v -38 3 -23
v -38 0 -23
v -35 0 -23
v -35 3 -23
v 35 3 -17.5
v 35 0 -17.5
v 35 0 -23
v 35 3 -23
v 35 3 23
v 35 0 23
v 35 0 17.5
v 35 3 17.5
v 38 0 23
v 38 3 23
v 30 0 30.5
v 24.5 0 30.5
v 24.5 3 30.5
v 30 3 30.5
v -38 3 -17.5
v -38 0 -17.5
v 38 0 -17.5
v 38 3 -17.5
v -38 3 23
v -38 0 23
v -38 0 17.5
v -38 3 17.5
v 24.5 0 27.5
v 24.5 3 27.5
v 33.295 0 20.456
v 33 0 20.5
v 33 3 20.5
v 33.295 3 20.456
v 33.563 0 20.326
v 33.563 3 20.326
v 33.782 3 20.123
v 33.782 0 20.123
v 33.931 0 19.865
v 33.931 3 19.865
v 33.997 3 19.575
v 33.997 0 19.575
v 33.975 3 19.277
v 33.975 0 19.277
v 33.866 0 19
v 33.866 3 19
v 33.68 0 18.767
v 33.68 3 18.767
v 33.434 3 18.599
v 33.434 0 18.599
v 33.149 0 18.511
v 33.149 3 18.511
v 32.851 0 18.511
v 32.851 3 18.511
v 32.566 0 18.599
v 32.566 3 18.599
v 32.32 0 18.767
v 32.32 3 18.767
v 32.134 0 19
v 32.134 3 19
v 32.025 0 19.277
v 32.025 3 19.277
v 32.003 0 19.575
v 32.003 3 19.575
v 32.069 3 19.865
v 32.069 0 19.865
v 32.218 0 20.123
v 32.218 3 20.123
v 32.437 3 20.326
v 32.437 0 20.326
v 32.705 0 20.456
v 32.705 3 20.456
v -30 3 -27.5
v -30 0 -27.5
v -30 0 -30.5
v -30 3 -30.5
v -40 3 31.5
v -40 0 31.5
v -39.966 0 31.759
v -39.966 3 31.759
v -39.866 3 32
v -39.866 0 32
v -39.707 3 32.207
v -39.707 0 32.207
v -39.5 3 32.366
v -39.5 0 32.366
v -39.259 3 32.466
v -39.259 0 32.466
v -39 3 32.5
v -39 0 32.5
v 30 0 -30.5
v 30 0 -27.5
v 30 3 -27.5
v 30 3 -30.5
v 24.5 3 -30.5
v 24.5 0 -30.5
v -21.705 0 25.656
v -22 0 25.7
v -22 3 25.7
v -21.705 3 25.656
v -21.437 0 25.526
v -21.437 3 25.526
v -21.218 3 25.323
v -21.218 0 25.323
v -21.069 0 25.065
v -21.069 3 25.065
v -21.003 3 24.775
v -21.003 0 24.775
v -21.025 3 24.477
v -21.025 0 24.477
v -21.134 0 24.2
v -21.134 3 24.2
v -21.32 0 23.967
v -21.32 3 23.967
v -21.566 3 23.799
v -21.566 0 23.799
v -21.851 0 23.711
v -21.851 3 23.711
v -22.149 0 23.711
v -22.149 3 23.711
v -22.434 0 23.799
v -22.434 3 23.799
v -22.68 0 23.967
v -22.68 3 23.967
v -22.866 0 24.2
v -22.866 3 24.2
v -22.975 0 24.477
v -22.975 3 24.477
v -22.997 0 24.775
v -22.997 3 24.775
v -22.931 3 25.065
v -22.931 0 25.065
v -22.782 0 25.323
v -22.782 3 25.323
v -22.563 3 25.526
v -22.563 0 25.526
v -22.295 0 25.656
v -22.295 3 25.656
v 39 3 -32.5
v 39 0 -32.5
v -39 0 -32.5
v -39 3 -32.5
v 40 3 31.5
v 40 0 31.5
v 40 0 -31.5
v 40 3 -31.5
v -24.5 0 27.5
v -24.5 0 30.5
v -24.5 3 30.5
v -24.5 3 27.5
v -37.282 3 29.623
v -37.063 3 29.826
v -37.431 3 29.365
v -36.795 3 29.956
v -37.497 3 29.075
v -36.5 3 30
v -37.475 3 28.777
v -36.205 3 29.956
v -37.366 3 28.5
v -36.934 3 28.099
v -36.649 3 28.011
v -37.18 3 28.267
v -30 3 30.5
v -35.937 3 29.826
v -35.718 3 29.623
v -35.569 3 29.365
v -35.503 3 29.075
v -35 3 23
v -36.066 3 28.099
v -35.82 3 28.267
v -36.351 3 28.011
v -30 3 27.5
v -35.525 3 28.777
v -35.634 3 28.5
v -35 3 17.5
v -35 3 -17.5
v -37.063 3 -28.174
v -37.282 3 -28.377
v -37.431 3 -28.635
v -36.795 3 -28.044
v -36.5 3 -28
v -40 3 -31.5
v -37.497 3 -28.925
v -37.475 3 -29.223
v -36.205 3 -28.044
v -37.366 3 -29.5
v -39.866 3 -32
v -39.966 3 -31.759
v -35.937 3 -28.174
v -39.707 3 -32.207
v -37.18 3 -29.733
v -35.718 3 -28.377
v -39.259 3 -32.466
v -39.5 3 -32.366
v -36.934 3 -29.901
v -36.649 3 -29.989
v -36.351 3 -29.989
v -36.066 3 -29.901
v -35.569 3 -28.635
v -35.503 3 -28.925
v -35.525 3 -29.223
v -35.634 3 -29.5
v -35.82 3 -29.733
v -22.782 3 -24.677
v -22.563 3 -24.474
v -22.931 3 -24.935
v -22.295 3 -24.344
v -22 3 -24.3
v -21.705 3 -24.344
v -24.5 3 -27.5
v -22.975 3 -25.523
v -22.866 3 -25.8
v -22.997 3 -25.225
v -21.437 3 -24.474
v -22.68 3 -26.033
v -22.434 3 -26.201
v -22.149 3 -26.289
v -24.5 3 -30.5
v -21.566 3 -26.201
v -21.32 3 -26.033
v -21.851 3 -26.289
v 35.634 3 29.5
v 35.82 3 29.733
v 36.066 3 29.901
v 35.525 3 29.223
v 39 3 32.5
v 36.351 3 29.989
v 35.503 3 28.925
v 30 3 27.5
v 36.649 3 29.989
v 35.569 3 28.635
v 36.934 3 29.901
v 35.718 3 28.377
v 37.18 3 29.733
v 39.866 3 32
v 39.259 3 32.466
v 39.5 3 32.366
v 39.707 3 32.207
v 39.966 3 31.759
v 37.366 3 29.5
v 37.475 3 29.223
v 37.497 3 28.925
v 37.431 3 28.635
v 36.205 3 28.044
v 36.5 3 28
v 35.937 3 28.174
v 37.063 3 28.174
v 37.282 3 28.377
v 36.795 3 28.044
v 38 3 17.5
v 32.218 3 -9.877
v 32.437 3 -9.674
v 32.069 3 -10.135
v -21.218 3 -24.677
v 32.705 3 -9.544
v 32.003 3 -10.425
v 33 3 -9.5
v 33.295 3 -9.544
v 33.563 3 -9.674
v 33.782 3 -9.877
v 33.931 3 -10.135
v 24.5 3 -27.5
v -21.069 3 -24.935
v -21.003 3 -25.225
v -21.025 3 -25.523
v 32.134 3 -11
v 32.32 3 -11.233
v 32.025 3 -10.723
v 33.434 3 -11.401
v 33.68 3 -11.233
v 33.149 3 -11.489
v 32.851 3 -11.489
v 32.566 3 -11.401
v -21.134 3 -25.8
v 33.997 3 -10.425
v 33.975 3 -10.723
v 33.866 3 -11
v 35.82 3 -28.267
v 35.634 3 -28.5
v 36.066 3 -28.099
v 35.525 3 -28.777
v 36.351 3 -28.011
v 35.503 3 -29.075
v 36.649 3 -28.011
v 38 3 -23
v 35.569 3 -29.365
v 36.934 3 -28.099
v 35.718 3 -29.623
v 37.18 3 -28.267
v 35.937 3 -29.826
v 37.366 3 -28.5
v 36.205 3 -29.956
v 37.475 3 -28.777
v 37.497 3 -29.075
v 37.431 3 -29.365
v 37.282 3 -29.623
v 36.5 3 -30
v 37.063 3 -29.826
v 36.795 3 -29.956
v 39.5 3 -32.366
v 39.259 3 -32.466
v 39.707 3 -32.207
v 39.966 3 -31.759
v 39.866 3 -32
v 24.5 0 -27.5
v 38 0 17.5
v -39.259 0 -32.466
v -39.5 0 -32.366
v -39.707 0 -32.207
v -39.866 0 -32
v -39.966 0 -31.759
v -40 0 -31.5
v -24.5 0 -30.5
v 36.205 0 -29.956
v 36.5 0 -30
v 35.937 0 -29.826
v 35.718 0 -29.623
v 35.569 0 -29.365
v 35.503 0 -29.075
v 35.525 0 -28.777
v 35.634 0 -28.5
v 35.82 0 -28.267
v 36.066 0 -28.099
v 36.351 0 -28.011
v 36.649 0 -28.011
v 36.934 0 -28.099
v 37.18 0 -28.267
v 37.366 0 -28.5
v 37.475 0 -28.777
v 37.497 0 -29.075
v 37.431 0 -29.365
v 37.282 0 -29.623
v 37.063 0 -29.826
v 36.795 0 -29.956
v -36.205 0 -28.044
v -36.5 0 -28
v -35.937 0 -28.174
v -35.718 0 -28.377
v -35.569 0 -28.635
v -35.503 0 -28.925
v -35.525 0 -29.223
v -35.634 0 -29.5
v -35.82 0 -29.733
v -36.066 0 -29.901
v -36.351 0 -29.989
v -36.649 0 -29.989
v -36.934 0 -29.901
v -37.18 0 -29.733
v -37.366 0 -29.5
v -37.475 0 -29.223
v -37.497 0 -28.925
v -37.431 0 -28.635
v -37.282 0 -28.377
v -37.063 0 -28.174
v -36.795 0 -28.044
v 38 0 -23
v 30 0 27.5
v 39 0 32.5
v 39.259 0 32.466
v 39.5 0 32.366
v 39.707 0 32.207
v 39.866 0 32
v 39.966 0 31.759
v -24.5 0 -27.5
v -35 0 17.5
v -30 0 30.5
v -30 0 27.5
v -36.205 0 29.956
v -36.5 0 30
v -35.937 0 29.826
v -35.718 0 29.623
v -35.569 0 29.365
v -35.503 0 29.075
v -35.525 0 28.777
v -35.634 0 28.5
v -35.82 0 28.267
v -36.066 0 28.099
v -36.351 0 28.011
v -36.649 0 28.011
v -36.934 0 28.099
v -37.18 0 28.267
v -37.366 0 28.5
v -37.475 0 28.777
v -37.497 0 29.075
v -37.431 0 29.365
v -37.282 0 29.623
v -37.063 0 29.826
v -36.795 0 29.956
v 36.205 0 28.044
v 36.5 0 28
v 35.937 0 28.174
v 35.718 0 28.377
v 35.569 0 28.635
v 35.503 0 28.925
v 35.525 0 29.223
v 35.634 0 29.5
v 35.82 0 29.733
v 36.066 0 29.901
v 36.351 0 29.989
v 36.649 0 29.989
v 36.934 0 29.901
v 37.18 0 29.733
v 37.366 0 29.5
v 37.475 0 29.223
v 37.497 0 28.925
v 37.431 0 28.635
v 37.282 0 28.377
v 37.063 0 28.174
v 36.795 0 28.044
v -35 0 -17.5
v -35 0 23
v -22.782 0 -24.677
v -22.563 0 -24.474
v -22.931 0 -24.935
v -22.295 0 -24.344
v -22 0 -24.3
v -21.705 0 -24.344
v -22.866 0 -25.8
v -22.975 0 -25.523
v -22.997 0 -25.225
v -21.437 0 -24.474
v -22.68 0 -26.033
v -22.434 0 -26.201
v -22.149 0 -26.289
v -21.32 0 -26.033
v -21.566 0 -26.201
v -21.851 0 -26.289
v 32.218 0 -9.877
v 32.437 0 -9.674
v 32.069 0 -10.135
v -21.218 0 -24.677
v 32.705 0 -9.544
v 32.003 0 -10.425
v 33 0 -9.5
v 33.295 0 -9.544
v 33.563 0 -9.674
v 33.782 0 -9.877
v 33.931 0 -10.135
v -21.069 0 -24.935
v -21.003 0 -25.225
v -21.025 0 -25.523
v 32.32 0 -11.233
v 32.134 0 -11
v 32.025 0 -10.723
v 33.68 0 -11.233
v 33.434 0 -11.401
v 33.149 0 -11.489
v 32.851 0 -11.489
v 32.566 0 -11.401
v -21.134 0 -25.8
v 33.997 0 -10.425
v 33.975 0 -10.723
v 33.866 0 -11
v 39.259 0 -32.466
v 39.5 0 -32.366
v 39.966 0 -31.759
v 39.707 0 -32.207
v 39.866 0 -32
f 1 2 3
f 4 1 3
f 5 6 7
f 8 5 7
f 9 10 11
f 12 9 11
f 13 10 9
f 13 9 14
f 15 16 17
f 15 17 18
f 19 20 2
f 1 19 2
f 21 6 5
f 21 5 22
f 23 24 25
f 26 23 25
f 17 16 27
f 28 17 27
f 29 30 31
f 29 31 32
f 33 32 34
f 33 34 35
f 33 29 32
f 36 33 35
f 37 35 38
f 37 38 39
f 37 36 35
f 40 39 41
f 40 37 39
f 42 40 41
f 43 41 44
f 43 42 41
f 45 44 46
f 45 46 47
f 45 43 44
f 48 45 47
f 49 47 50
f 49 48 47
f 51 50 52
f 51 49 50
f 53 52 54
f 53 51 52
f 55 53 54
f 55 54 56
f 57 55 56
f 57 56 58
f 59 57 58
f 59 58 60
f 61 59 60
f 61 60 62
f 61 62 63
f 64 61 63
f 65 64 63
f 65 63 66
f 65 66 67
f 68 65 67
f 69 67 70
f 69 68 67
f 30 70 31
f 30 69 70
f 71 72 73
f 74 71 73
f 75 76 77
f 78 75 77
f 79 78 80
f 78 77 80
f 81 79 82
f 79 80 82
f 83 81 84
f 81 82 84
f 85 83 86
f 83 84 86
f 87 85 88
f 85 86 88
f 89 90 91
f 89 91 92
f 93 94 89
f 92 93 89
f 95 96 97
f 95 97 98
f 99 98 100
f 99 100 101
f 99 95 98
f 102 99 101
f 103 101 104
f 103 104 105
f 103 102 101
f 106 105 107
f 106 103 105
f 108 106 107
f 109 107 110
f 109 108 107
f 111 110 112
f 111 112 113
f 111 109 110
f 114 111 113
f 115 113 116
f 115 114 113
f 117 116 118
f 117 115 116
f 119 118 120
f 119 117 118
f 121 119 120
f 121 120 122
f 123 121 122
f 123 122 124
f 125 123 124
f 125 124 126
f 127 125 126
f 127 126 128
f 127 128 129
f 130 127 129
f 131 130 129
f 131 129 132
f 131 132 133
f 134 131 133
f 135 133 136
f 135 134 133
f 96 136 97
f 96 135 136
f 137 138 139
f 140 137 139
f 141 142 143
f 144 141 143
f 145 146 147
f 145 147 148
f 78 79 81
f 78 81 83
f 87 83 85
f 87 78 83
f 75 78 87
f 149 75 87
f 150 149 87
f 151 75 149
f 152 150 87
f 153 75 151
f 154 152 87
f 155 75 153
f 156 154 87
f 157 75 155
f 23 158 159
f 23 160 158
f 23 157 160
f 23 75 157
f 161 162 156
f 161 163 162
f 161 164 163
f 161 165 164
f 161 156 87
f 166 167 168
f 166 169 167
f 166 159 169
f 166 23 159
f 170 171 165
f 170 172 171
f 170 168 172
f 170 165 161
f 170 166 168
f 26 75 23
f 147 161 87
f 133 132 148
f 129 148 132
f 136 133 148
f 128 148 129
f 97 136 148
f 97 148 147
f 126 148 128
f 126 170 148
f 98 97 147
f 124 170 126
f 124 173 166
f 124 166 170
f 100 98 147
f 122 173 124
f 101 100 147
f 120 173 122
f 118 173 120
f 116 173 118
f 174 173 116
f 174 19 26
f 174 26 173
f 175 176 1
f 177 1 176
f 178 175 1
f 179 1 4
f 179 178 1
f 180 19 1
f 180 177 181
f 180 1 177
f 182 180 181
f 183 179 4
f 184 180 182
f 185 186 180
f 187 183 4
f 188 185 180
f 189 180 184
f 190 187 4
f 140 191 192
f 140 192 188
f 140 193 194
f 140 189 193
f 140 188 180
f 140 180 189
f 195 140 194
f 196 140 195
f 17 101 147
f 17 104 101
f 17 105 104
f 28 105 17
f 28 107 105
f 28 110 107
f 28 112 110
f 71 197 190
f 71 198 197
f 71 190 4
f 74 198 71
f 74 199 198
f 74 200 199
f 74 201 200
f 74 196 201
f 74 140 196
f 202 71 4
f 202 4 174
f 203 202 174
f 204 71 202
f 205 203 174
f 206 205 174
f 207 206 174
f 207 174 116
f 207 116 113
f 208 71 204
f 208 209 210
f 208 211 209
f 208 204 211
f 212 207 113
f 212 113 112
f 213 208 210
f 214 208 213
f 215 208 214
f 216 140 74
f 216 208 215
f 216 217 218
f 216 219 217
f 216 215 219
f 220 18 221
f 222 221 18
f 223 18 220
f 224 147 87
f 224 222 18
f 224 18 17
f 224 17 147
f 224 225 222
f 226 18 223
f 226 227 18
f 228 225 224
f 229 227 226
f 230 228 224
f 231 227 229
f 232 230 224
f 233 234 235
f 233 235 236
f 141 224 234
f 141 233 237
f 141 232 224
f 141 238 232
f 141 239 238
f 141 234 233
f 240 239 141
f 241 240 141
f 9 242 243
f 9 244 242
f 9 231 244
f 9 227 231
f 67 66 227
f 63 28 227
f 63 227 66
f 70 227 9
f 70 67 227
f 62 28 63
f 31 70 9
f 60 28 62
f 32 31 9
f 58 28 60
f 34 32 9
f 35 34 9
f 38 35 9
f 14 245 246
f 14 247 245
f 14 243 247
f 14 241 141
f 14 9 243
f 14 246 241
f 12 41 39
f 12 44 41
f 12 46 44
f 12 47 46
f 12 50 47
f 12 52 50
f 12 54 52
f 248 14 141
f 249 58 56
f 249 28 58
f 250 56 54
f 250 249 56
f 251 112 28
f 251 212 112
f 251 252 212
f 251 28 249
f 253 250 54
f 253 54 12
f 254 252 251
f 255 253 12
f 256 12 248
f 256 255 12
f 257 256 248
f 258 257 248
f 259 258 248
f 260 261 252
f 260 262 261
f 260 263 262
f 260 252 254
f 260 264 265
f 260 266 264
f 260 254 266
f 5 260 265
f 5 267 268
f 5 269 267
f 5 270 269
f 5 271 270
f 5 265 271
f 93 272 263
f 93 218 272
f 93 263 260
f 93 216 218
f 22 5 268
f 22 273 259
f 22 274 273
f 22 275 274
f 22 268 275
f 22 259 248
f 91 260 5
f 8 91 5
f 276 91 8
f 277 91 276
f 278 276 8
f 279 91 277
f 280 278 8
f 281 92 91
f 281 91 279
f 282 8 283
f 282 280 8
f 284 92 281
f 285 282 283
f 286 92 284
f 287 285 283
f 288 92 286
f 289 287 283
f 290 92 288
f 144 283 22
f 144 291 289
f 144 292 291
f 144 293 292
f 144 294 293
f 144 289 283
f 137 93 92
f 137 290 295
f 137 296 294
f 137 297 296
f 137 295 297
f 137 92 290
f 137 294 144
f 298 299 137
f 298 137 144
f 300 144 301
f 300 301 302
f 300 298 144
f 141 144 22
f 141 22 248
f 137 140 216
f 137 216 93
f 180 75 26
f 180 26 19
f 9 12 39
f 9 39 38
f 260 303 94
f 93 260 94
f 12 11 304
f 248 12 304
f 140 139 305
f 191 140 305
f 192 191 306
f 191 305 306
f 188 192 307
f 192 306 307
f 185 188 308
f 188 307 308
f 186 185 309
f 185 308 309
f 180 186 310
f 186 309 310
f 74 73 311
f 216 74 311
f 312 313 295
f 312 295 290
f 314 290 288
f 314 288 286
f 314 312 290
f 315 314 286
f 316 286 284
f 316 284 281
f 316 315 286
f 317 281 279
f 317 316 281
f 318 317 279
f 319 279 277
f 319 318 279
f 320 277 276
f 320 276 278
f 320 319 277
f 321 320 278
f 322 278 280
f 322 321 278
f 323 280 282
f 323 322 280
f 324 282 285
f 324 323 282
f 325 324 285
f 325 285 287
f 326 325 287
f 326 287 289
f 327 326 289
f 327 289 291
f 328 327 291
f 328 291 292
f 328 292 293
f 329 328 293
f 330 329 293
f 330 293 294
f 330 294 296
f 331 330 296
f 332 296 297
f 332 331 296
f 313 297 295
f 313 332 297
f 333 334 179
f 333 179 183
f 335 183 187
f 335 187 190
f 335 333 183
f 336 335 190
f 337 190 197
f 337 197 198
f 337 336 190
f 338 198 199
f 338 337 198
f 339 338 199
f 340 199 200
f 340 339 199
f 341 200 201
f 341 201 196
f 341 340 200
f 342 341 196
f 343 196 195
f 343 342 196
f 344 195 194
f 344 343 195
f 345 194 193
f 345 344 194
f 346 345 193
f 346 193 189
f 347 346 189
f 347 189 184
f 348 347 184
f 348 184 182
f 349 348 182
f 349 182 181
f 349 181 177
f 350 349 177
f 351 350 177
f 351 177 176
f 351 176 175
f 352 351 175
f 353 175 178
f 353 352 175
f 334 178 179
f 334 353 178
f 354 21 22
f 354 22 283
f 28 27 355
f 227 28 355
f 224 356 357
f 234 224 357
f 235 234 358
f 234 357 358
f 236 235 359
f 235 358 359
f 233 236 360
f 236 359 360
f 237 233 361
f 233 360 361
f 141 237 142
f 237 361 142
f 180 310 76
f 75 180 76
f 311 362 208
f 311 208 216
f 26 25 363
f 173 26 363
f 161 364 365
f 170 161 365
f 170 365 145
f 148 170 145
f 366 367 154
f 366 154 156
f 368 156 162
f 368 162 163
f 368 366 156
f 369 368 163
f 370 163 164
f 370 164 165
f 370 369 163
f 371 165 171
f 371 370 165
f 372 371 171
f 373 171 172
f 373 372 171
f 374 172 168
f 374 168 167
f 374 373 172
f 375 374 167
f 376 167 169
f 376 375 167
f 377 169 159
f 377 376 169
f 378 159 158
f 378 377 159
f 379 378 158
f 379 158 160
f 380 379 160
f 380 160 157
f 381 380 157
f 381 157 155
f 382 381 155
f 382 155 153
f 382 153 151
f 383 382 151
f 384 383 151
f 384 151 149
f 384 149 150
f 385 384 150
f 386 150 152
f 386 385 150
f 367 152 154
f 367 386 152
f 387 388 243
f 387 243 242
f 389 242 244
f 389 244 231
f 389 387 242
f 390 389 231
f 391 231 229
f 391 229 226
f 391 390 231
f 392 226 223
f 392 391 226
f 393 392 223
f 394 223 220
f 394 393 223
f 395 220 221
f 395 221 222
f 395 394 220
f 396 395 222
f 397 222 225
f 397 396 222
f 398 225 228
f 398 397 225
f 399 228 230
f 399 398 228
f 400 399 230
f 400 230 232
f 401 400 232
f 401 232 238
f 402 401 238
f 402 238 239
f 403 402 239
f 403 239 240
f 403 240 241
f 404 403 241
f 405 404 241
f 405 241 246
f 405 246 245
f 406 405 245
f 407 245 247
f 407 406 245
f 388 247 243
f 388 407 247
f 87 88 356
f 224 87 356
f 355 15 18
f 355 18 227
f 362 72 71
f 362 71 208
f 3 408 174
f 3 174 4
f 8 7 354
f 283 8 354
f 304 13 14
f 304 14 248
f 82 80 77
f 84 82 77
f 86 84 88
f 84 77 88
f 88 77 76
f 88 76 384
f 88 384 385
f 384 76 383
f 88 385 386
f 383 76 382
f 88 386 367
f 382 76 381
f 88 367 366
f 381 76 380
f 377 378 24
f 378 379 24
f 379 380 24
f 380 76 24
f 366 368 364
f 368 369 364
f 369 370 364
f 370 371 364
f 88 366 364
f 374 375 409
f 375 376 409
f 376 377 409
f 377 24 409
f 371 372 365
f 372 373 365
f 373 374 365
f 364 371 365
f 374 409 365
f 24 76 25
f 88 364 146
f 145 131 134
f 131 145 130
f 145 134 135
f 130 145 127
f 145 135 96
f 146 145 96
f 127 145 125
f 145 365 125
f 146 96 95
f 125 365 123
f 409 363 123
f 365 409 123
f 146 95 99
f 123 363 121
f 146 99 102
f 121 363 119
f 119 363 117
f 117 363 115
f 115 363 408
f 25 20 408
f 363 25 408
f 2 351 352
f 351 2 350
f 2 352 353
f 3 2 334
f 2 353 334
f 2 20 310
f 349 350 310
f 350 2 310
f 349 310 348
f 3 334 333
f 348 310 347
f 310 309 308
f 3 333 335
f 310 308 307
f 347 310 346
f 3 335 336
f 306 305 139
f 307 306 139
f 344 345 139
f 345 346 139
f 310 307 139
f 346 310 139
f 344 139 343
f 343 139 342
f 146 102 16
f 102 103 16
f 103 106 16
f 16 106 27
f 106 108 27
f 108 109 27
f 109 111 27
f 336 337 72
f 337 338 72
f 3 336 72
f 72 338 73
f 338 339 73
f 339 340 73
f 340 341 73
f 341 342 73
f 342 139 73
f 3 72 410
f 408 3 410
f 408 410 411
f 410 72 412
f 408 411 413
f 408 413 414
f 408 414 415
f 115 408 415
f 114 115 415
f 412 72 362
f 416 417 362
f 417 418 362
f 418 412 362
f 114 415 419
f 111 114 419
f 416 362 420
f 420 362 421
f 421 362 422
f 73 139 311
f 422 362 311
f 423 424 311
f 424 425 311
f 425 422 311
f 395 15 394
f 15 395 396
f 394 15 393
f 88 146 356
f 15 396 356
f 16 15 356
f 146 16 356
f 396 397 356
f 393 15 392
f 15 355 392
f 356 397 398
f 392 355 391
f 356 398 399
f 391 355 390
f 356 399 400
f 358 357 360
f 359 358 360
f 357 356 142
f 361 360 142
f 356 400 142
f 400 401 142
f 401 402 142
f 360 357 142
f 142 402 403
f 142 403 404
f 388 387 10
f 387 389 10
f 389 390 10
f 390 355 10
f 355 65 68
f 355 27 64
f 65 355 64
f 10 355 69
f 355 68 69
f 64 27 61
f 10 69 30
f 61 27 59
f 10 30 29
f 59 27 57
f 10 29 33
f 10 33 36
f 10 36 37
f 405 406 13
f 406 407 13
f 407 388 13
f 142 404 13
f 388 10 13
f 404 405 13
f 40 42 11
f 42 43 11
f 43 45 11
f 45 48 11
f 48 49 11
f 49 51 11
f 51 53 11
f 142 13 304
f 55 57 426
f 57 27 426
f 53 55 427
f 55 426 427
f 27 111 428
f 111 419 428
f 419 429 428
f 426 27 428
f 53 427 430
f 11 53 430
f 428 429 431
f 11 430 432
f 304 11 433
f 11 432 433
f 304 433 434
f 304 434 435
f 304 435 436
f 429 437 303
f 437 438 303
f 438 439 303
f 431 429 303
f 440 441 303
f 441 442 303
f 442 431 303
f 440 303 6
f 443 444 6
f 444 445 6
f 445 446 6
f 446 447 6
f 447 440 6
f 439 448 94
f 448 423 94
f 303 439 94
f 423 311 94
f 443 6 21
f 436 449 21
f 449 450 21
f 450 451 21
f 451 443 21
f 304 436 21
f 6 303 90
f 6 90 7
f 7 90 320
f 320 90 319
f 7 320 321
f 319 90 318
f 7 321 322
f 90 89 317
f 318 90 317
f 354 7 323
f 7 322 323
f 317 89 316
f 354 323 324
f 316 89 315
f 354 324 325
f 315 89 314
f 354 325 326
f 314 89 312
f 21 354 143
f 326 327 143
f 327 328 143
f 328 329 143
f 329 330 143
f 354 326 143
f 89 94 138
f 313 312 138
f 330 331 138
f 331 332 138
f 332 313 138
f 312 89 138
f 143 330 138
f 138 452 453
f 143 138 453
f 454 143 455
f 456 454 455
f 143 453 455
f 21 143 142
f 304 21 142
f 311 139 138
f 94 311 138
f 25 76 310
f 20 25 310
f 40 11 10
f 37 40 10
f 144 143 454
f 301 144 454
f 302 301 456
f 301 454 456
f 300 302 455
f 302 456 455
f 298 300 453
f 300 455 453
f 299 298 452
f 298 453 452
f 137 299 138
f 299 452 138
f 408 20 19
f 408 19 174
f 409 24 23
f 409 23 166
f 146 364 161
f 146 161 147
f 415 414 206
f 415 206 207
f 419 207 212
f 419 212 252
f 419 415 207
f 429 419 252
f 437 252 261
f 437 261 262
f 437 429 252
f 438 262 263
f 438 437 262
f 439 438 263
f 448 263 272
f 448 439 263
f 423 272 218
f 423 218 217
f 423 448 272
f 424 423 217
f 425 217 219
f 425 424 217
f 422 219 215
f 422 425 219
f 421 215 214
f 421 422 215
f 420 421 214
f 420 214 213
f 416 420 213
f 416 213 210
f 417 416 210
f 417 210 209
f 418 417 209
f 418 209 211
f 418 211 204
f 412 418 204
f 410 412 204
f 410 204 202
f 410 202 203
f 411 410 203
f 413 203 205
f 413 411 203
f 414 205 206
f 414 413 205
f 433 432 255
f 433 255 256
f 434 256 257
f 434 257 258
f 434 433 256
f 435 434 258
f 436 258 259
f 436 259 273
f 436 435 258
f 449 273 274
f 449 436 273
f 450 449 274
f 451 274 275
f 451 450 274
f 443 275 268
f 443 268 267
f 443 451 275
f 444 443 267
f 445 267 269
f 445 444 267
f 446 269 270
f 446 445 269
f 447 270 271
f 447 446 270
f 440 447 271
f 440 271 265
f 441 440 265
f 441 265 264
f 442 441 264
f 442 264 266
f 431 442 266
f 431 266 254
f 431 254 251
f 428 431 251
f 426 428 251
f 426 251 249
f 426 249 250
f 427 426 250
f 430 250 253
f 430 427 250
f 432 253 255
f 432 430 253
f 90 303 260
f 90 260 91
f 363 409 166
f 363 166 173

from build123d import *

# Parameters (mm, degrees)
CROQUIS1_R              = 1
CROQUIS1_W              = 3
CROQUIS1_H              = 5.5
CROQUIS1_W_2            = 5.5
CROQUIS1_H_2            = 3
SALIENTE_EXTRUIR1_DEPTH = 3


with BuildPart() as part:
    # Croquis1 → Saliente-Extruir1 (new body)
    with BuildSketch(Plane(origin=(0, 0, 0), x_dir=(1, 0, 0), z_dir=(0, 1, 0))):
        with BuildLine():
            Line((-39, -32.5), (39, -32.5))
            ThreePointArc((39, -32.5), (39.707106781, -32.207106781), (40, -31.5))
            Line((40, -31.5), (40, 31.5))
            ThreePointArc((40, 31.5), (39.707106781, 32.207106781), (39, 32.5))
            Line((39, 32.5), (-39, 32.5))
            ThreePointArc((-39, 32.5), (-39.707106781, 32.207106781), (-40, 31.5))
            Line((-40, 31.5), (-40, -31.5))
            ThreePointArc((-40, -31.5), (-39.707106781, -32.207106781), (-39, -32.5))
        make_face()
        with Locations(Location((-36.5, 29, 0), (0, 0, 270))):
            Circle(CROQUIS1_R, mode=Mode.SUBTRACT)
        with Locations(Location((-36.5, -29, 0), (0, 0, 270))):
            Circle(CROQUIS1_R, mode=Mode.SUBTRACT)
        with Locations(Location((36.5, -29, 0), (0, 0, 90))):
            Circle(CROQUIS1_R, mode=Mode.SUBTRACT)
        with Locations(Location((36.5, 29, 0), (0, 0, 90))):
            Circle(CROQUIS1_R, mode=Mode.SUBTRACT)
        with Locations(Location((-22, 25.3, 0), (0, 0, 270))):
            Circle(CROQUIS1_R, mode=Mode.SUBTRACT)
        with Locations(Location((-22, -24.7, 0), (0, 0, 270))):
            Circle(CROQUIS1_R, mode=Mode.SUBTRACT)
        with Locations(Location((33, 10.5, 0), (0, 0, 270))):
            Circle(CROQUIS1_R, mode=Mode.SUBTRACT)
        with Locations(Location((33, -19.5, 0), (0, 0, 270))):
            Circle(CROQUIS1_R, mode=Mode.SUBTRACT)
        with Locations((-36.5, 20.25)):
            Rectangle(CROQUIS1_W, CROQUIS1_H, mode=Mode.SUBTRACT)
        with Locations((-36.5, -20.25)):
            Rectangle(CROQUIS1_W, CROQUIS1_H, mode=Mode.SUBTRACT)
        with Locations((-27.25, 29)):
            Rectangle(CROQUIS1_W_2, CROQUIS1_H_2, mode=Mode.SUBTRACT)
        with Locations((-27.25, -29)):
            Rectangle(CROQUIS1_W_2, CROQUIS1_H_2, mode=Mode.SUBTRACT)
        with Locations((27.25, -29)):
            Rectangle(CROQUIS1_W_2, CROQUIS1_H_2, mode=Mode.SUBTRACT)
        with Locations((36.5, -20.25)):
            Rectangle(CROQUIS1_W, CROQUIS1_H, mode=Mode.SUBTRACT)
        with Locations((36.5, 20.25)):
            Rectangle(CROQUIS1_W, CROQUIS1_H, mode=Mode.SUBTRACT)
        with Locations((27.25, 29)):
            Rectangle(CROQUIS1_W_2, CROQUIS1_H_2, mode=Mode.SUBTRACT)
    extrude(amount=SALIENTE_EXTRUIR1_DEPTH)


solid = part.part
